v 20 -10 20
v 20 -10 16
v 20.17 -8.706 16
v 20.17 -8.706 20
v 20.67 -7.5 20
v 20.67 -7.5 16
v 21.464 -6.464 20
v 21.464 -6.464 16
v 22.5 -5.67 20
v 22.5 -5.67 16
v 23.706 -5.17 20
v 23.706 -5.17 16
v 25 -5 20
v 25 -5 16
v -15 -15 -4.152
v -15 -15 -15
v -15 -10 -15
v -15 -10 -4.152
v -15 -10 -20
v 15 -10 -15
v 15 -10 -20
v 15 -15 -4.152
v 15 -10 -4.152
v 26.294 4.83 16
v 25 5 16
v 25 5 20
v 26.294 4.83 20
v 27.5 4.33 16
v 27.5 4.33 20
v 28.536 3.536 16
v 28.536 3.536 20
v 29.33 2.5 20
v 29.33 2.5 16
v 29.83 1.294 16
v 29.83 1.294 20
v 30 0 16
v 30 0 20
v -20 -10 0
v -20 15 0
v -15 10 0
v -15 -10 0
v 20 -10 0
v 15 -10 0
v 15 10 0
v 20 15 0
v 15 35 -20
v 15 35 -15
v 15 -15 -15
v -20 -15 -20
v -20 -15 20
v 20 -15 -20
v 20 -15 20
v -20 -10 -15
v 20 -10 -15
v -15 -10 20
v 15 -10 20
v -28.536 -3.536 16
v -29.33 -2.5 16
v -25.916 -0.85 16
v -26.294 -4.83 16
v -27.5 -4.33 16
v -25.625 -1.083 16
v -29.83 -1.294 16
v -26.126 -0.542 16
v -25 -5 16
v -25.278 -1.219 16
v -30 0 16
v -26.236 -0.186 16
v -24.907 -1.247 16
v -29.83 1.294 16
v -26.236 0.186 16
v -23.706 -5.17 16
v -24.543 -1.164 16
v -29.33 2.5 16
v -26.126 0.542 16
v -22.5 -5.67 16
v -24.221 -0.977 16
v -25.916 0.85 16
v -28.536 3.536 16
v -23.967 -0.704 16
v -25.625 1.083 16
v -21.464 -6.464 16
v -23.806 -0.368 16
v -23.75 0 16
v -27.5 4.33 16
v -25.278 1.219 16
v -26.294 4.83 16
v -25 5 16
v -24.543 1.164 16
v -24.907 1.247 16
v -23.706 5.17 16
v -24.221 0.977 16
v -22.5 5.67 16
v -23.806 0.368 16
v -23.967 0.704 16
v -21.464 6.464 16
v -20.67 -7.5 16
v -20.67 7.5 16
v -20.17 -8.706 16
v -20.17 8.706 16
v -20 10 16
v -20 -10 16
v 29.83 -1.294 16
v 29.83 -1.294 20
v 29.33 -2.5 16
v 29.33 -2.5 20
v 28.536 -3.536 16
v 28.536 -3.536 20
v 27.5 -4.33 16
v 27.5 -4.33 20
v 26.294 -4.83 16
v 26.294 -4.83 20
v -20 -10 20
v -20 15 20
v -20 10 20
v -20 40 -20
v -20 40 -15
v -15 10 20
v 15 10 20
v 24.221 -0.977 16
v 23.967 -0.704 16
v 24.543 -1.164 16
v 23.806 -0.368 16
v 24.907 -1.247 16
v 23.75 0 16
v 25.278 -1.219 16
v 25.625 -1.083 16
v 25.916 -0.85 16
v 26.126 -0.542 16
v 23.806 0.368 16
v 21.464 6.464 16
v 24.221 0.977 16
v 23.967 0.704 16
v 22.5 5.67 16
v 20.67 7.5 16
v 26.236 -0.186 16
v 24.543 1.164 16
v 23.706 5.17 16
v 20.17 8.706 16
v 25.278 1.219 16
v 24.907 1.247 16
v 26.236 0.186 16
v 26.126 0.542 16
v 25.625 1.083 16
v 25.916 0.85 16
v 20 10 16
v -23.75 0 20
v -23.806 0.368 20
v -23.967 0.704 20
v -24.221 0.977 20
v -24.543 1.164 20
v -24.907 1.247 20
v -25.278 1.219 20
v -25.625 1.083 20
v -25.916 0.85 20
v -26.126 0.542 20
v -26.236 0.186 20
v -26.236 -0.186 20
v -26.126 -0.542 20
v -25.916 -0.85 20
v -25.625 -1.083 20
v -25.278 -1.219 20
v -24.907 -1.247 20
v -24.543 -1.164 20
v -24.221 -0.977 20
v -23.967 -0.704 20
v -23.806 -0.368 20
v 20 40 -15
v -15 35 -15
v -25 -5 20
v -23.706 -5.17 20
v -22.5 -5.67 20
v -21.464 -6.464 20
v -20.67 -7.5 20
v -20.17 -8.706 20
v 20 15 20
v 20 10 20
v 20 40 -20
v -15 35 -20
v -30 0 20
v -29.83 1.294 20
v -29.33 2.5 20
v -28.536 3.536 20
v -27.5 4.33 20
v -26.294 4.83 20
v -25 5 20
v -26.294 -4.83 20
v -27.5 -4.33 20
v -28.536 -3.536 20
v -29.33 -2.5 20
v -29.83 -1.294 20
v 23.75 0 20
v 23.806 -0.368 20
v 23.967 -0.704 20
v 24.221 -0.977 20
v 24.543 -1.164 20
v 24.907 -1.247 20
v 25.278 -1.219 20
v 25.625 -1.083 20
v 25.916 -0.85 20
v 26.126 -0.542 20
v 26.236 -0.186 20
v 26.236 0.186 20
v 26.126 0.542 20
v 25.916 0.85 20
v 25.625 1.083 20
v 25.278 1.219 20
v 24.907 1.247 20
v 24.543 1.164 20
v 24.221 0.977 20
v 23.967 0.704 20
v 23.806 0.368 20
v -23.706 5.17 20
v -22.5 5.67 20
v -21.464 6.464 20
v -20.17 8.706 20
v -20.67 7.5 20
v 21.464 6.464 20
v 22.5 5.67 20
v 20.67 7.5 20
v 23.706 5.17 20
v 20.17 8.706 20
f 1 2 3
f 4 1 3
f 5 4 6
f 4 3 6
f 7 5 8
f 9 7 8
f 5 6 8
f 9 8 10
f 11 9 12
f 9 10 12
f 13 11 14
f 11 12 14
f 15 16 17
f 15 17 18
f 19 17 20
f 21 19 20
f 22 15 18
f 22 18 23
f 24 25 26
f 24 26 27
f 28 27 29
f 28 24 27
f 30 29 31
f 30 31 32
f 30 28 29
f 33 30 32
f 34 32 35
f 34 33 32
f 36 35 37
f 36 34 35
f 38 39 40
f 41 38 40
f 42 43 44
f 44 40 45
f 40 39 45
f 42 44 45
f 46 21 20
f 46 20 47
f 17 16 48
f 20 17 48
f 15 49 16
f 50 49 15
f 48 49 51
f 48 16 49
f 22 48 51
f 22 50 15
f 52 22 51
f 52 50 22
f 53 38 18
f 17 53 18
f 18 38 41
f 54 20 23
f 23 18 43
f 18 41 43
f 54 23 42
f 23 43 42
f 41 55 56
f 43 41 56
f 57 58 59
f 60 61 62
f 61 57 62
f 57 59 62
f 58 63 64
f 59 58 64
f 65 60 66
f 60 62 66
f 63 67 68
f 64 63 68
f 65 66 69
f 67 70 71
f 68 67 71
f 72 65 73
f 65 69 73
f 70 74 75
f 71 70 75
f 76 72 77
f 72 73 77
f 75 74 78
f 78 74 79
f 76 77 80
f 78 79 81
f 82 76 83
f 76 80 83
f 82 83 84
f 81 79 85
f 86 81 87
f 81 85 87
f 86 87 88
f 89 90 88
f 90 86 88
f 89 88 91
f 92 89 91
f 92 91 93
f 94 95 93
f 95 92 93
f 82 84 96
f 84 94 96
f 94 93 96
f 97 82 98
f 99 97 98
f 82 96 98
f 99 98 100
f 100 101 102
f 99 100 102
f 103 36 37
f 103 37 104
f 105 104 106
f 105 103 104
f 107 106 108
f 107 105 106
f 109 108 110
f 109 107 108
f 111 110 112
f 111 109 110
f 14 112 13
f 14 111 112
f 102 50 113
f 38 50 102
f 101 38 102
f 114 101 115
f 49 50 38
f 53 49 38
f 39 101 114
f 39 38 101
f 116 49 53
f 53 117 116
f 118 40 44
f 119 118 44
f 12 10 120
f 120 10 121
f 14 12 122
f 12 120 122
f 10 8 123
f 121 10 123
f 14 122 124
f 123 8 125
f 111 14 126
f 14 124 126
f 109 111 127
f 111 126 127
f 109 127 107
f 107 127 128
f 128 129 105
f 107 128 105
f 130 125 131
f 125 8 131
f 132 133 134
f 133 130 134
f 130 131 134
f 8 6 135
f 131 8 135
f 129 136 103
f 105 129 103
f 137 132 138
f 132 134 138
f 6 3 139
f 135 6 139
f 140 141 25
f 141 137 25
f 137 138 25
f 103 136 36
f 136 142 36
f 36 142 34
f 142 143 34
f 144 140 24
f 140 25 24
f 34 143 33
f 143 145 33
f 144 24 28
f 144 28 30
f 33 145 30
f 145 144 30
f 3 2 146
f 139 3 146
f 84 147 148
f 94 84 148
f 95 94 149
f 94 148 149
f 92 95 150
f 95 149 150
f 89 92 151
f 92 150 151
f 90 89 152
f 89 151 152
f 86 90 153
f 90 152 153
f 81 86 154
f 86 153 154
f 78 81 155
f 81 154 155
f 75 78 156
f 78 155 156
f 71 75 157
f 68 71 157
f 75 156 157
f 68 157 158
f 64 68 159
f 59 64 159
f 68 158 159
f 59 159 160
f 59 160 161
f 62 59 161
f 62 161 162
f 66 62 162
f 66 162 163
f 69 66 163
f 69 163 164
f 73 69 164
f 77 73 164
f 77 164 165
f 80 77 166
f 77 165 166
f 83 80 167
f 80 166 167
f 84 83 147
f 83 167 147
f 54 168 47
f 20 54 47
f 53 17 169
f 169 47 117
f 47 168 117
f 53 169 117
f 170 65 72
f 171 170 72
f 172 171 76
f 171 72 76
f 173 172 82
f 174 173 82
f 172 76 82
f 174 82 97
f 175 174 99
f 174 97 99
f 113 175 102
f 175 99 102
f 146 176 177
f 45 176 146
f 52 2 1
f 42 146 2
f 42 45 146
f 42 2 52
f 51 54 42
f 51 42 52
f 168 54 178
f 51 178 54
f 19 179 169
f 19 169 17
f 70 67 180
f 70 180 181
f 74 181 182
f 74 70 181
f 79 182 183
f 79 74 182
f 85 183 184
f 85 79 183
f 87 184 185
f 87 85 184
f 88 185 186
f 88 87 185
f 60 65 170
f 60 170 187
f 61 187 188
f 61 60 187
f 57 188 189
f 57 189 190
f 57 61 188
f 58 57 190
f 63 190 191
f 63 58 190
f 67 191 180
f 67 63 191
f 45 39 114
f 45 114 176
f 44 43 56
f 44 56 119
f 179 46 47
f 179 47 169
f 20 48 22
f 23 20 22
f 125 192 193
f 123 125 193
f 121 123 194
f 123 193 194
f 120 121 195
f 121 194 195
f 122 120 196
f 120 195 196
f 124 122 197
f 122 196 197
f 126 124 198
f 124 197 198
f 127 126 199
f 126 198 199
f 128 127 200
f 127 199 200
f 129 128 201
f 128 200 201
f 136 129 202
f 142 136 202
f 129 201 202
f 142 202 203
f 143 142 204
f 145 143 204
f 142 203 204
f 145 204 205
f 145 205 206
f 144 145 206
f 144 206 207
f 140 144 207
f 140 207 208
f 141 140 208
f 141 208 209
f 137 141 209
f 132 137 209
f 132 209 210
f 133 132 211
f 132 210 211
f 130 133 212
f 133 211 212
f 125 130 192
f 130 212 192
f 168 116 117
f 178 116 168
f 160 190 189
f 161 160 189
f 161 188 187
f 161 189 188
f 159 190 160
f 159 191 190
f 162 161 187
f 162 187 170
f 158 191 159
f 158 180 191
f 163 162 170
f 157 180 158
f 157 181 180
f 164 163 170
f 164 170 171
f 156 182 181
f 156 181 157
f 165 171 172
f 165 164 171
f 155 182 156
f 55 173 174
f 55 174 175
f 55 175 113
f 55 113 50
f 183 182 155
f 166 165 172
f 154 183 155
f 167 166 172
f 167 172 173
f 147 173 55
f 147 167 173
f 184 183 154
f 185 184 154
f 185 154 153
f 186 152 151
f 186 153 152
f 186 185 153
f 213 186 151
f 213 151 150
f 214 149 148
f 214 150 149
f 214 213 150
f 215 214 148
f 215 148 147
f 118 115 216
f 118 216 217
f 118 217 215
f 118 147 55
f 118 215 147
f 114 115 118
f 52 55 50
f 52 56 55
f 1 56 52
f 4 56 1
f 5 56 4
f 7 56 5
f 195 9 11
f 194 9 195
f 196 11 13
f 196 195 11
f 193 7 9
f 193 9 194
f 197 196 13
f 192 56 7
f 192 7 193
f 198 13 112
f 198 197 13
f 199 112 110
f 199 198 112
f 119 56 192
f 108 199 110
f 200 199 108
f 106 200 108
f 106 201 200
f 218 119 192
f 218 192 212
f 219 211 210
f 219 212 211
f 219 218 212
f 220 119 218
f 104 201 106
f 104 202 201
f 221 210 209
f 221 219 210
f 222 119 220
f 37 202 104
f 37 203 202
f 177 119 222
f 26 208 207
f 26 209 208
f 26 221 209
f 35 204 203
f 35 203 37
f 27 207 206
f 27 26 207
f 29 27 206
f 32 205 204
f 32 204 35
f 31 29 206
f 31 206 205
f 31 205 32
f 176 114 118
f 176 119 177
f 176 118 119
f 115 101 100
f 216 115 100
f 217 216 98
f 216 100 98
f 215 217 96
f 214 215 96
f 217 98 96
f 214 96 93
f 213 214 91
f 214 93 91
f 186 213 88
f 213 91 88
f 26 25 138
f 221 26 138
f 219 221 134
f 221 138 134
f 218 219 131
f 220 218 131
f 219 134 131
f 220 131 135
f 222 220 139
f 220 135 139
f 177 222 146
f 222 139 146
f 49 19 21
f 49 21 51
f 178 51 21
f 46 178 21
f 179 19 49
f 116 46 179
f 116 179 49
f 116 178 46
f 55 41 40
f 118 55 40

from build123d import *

# Parameters (mm, degrees)
SKETCH1_W           = 40
SKETCH1_H           = 30
SKETCH1_W_2         = 30
SKETCH1_H_2         = 20
BOSS_EXTRUDE1_DEPTH = 20
SKETCH2_W           = 10
SKETCH2_H           = 10
SKETCH2_R           = 1.25
BOSS_EXTRUDE2_DEPTH = 4
FILLET1_START       = 16
FILLET1_DEPTH       = 4
FILLET1_2_DEPTH     = 4
SKETCH3_W           = 40
SKETCH3_H           = 20
SKETCH3_W_2         = 30
SKETCH3_H_2         = 10.847900724
BOSS_EXTRUDE3_DEPTH = 5
SKETCH4_W           = 15
SKETCH4_H           = 5
BOSS_EXTRUDE4_DEPTH = 5


with BuildPart() as part:
    # Sketch1 → Boss-Extrude1 (new body)
    with BuildSketch(Plane.XY):
        Rectangle(SKETCH1_W, SKETCH1_H)
        Rectangle(SKETCH1_W_2, SKETCH1_H_2, mode=Mode.SUBTRACT)
    extrude(amount=BOSS_EXTRUDE1_DEPTH)

    # Sketch2 → Boss-Extrude2 (add)
    # profile 1 of 2: a face of its own
    with BuildSketch(Plane.XY.offset(20)):
        with Locations((-25, 0)):
            Rectangle(SKETCH2_W, SKETCH2_H)
        with Locations((-25, 0)):
            Circle(SKETCH2_R, mode=Mode.SUBTRACT)
    # profile 2 of 2: a face of its own
    with BuildSketch(Plane.XY.offset(20)):
        with Locations((25, 0)):
            Rectangle(SKETCH2_W, SKETCH2_H)
        with Locations(Location((25, 0, 0), (0, 0, 180))):
            Circle(SKETCH2_R, mode=Mode.SUBTRACT)
    extrude(amount=-BOSS_EXTRUDE2_DEPTH)

    # Fillet1: read off the stored shape, not the designer's step
    # Fillet1 outline → Fillet1 (cut)
    with BuildSketch(Plane.XY.offset(FILLET1_START)):
        with BuildLine():
            ThreePointArc((30, 0), (28.535533906, -3.535533906), (25, -5))
            Line((25, -5), (30, -5))
            Line((30, -5), (30, 0))
        make_face()
        with BuildLine():
            ThreePointArc((25, 5), (28.535533906, 3.535533906), (30, 0))
            Line((30, 0), (30, 5))
            Line((30, 5), (25, 5))
        make_face()
        with BuildLine():
            ThreePointArc((-30, 0), (-28.535533906, 3.535533906), (-25, 5))
            Line((-25, 5), (-30, 5))
            Line((-30, 5), (-30, 0))
        make_face()
        with BuildLine():
            ThreePointArc((-25, -5), (-28.535533906, -3.535533906), (-30, 0))
            Line((-30, 0), (-30, -5))
            Line((-30, -5), (-25, -5))
        make_face()
    extrude(amount=FILLET1_DEPTH, mode=Mode.SUBTRACT)

    # Fillet1 2 outline → Fillet1 2 (add)
    with BuildSketch(Plane.XY.offset(FILLET1_START)):
        with BuildLine():
            ThreePointArc((20, -10), (21.464466094, -6.464466094), (25, -5))
            Line((25, -5), (20, -5))
            Line((20, -5), (20, -10))
        make_face()
        with BuildLine():
            Line((20, 5), (25, 5))
            ThreePointArc((25, 5), (21.464466094, 6.464466094), (20, 10))
            Line((20, 10), (20, 5))
        make_face()
        with BuildLine():
            ThreePointArc((-20, 10), (-21.464466094, 6.464466094), (-25, 5))
            Line((-25, 5), (-20, 5))
            Line((-20, 5), (-20, 10))
        make_face()
        with BuildLine():
            Line((-20, -5), (-25, -5))
            ThreePointArc((-25, -5), (-21.464466094, -6.464466094), (-20, -10))
            Line((-20, -10), (-20, -5))
        make_face()
    extrude(amount=FILLET1_2_DEPTH)

    # Sketch3 → Boss-Extrude3 (add)
    with BuildSketch(Plane.XZ.offset(15)):
        with Locations((0, -10)):
            Rectangle(SKETCH3_W, SKETCH3_H)
        with Locations((0, -9.576049638)):
            Rectangle(SKETCH3_W_2, SKETCH3_H_2, mode=Mode.SUBTRACT)
    extrude(amount=-BOSS_EXTRUDE3_DEPTH)

    # Sketch4 → Boss-Extrude4 (add)
    with BuildSketch(Plane(origin=(0, 0, -20), x_dir=(-1, 0, 0), z_dir=(0, 0, -1))):
        Polygon((20, 40), (15, 40), (15, 35), (15, -10), (20, -10), align=None)
        with Locations((7.5, 37.5)):
            Rectangle(SKETCH4_W, SKETCH4_H)
        with Locations((-7.5, 37.5)):
            Rectangle(SKETCH4_W, SKETCH4_H)
        Polygon((-15, 35), (-15, 40), (-20, 40), (-20, -10), (-15, -10), align=None)
    extrude(amount=-BOSS_EXTRUDE4_DEPTH)


solid = part.part
